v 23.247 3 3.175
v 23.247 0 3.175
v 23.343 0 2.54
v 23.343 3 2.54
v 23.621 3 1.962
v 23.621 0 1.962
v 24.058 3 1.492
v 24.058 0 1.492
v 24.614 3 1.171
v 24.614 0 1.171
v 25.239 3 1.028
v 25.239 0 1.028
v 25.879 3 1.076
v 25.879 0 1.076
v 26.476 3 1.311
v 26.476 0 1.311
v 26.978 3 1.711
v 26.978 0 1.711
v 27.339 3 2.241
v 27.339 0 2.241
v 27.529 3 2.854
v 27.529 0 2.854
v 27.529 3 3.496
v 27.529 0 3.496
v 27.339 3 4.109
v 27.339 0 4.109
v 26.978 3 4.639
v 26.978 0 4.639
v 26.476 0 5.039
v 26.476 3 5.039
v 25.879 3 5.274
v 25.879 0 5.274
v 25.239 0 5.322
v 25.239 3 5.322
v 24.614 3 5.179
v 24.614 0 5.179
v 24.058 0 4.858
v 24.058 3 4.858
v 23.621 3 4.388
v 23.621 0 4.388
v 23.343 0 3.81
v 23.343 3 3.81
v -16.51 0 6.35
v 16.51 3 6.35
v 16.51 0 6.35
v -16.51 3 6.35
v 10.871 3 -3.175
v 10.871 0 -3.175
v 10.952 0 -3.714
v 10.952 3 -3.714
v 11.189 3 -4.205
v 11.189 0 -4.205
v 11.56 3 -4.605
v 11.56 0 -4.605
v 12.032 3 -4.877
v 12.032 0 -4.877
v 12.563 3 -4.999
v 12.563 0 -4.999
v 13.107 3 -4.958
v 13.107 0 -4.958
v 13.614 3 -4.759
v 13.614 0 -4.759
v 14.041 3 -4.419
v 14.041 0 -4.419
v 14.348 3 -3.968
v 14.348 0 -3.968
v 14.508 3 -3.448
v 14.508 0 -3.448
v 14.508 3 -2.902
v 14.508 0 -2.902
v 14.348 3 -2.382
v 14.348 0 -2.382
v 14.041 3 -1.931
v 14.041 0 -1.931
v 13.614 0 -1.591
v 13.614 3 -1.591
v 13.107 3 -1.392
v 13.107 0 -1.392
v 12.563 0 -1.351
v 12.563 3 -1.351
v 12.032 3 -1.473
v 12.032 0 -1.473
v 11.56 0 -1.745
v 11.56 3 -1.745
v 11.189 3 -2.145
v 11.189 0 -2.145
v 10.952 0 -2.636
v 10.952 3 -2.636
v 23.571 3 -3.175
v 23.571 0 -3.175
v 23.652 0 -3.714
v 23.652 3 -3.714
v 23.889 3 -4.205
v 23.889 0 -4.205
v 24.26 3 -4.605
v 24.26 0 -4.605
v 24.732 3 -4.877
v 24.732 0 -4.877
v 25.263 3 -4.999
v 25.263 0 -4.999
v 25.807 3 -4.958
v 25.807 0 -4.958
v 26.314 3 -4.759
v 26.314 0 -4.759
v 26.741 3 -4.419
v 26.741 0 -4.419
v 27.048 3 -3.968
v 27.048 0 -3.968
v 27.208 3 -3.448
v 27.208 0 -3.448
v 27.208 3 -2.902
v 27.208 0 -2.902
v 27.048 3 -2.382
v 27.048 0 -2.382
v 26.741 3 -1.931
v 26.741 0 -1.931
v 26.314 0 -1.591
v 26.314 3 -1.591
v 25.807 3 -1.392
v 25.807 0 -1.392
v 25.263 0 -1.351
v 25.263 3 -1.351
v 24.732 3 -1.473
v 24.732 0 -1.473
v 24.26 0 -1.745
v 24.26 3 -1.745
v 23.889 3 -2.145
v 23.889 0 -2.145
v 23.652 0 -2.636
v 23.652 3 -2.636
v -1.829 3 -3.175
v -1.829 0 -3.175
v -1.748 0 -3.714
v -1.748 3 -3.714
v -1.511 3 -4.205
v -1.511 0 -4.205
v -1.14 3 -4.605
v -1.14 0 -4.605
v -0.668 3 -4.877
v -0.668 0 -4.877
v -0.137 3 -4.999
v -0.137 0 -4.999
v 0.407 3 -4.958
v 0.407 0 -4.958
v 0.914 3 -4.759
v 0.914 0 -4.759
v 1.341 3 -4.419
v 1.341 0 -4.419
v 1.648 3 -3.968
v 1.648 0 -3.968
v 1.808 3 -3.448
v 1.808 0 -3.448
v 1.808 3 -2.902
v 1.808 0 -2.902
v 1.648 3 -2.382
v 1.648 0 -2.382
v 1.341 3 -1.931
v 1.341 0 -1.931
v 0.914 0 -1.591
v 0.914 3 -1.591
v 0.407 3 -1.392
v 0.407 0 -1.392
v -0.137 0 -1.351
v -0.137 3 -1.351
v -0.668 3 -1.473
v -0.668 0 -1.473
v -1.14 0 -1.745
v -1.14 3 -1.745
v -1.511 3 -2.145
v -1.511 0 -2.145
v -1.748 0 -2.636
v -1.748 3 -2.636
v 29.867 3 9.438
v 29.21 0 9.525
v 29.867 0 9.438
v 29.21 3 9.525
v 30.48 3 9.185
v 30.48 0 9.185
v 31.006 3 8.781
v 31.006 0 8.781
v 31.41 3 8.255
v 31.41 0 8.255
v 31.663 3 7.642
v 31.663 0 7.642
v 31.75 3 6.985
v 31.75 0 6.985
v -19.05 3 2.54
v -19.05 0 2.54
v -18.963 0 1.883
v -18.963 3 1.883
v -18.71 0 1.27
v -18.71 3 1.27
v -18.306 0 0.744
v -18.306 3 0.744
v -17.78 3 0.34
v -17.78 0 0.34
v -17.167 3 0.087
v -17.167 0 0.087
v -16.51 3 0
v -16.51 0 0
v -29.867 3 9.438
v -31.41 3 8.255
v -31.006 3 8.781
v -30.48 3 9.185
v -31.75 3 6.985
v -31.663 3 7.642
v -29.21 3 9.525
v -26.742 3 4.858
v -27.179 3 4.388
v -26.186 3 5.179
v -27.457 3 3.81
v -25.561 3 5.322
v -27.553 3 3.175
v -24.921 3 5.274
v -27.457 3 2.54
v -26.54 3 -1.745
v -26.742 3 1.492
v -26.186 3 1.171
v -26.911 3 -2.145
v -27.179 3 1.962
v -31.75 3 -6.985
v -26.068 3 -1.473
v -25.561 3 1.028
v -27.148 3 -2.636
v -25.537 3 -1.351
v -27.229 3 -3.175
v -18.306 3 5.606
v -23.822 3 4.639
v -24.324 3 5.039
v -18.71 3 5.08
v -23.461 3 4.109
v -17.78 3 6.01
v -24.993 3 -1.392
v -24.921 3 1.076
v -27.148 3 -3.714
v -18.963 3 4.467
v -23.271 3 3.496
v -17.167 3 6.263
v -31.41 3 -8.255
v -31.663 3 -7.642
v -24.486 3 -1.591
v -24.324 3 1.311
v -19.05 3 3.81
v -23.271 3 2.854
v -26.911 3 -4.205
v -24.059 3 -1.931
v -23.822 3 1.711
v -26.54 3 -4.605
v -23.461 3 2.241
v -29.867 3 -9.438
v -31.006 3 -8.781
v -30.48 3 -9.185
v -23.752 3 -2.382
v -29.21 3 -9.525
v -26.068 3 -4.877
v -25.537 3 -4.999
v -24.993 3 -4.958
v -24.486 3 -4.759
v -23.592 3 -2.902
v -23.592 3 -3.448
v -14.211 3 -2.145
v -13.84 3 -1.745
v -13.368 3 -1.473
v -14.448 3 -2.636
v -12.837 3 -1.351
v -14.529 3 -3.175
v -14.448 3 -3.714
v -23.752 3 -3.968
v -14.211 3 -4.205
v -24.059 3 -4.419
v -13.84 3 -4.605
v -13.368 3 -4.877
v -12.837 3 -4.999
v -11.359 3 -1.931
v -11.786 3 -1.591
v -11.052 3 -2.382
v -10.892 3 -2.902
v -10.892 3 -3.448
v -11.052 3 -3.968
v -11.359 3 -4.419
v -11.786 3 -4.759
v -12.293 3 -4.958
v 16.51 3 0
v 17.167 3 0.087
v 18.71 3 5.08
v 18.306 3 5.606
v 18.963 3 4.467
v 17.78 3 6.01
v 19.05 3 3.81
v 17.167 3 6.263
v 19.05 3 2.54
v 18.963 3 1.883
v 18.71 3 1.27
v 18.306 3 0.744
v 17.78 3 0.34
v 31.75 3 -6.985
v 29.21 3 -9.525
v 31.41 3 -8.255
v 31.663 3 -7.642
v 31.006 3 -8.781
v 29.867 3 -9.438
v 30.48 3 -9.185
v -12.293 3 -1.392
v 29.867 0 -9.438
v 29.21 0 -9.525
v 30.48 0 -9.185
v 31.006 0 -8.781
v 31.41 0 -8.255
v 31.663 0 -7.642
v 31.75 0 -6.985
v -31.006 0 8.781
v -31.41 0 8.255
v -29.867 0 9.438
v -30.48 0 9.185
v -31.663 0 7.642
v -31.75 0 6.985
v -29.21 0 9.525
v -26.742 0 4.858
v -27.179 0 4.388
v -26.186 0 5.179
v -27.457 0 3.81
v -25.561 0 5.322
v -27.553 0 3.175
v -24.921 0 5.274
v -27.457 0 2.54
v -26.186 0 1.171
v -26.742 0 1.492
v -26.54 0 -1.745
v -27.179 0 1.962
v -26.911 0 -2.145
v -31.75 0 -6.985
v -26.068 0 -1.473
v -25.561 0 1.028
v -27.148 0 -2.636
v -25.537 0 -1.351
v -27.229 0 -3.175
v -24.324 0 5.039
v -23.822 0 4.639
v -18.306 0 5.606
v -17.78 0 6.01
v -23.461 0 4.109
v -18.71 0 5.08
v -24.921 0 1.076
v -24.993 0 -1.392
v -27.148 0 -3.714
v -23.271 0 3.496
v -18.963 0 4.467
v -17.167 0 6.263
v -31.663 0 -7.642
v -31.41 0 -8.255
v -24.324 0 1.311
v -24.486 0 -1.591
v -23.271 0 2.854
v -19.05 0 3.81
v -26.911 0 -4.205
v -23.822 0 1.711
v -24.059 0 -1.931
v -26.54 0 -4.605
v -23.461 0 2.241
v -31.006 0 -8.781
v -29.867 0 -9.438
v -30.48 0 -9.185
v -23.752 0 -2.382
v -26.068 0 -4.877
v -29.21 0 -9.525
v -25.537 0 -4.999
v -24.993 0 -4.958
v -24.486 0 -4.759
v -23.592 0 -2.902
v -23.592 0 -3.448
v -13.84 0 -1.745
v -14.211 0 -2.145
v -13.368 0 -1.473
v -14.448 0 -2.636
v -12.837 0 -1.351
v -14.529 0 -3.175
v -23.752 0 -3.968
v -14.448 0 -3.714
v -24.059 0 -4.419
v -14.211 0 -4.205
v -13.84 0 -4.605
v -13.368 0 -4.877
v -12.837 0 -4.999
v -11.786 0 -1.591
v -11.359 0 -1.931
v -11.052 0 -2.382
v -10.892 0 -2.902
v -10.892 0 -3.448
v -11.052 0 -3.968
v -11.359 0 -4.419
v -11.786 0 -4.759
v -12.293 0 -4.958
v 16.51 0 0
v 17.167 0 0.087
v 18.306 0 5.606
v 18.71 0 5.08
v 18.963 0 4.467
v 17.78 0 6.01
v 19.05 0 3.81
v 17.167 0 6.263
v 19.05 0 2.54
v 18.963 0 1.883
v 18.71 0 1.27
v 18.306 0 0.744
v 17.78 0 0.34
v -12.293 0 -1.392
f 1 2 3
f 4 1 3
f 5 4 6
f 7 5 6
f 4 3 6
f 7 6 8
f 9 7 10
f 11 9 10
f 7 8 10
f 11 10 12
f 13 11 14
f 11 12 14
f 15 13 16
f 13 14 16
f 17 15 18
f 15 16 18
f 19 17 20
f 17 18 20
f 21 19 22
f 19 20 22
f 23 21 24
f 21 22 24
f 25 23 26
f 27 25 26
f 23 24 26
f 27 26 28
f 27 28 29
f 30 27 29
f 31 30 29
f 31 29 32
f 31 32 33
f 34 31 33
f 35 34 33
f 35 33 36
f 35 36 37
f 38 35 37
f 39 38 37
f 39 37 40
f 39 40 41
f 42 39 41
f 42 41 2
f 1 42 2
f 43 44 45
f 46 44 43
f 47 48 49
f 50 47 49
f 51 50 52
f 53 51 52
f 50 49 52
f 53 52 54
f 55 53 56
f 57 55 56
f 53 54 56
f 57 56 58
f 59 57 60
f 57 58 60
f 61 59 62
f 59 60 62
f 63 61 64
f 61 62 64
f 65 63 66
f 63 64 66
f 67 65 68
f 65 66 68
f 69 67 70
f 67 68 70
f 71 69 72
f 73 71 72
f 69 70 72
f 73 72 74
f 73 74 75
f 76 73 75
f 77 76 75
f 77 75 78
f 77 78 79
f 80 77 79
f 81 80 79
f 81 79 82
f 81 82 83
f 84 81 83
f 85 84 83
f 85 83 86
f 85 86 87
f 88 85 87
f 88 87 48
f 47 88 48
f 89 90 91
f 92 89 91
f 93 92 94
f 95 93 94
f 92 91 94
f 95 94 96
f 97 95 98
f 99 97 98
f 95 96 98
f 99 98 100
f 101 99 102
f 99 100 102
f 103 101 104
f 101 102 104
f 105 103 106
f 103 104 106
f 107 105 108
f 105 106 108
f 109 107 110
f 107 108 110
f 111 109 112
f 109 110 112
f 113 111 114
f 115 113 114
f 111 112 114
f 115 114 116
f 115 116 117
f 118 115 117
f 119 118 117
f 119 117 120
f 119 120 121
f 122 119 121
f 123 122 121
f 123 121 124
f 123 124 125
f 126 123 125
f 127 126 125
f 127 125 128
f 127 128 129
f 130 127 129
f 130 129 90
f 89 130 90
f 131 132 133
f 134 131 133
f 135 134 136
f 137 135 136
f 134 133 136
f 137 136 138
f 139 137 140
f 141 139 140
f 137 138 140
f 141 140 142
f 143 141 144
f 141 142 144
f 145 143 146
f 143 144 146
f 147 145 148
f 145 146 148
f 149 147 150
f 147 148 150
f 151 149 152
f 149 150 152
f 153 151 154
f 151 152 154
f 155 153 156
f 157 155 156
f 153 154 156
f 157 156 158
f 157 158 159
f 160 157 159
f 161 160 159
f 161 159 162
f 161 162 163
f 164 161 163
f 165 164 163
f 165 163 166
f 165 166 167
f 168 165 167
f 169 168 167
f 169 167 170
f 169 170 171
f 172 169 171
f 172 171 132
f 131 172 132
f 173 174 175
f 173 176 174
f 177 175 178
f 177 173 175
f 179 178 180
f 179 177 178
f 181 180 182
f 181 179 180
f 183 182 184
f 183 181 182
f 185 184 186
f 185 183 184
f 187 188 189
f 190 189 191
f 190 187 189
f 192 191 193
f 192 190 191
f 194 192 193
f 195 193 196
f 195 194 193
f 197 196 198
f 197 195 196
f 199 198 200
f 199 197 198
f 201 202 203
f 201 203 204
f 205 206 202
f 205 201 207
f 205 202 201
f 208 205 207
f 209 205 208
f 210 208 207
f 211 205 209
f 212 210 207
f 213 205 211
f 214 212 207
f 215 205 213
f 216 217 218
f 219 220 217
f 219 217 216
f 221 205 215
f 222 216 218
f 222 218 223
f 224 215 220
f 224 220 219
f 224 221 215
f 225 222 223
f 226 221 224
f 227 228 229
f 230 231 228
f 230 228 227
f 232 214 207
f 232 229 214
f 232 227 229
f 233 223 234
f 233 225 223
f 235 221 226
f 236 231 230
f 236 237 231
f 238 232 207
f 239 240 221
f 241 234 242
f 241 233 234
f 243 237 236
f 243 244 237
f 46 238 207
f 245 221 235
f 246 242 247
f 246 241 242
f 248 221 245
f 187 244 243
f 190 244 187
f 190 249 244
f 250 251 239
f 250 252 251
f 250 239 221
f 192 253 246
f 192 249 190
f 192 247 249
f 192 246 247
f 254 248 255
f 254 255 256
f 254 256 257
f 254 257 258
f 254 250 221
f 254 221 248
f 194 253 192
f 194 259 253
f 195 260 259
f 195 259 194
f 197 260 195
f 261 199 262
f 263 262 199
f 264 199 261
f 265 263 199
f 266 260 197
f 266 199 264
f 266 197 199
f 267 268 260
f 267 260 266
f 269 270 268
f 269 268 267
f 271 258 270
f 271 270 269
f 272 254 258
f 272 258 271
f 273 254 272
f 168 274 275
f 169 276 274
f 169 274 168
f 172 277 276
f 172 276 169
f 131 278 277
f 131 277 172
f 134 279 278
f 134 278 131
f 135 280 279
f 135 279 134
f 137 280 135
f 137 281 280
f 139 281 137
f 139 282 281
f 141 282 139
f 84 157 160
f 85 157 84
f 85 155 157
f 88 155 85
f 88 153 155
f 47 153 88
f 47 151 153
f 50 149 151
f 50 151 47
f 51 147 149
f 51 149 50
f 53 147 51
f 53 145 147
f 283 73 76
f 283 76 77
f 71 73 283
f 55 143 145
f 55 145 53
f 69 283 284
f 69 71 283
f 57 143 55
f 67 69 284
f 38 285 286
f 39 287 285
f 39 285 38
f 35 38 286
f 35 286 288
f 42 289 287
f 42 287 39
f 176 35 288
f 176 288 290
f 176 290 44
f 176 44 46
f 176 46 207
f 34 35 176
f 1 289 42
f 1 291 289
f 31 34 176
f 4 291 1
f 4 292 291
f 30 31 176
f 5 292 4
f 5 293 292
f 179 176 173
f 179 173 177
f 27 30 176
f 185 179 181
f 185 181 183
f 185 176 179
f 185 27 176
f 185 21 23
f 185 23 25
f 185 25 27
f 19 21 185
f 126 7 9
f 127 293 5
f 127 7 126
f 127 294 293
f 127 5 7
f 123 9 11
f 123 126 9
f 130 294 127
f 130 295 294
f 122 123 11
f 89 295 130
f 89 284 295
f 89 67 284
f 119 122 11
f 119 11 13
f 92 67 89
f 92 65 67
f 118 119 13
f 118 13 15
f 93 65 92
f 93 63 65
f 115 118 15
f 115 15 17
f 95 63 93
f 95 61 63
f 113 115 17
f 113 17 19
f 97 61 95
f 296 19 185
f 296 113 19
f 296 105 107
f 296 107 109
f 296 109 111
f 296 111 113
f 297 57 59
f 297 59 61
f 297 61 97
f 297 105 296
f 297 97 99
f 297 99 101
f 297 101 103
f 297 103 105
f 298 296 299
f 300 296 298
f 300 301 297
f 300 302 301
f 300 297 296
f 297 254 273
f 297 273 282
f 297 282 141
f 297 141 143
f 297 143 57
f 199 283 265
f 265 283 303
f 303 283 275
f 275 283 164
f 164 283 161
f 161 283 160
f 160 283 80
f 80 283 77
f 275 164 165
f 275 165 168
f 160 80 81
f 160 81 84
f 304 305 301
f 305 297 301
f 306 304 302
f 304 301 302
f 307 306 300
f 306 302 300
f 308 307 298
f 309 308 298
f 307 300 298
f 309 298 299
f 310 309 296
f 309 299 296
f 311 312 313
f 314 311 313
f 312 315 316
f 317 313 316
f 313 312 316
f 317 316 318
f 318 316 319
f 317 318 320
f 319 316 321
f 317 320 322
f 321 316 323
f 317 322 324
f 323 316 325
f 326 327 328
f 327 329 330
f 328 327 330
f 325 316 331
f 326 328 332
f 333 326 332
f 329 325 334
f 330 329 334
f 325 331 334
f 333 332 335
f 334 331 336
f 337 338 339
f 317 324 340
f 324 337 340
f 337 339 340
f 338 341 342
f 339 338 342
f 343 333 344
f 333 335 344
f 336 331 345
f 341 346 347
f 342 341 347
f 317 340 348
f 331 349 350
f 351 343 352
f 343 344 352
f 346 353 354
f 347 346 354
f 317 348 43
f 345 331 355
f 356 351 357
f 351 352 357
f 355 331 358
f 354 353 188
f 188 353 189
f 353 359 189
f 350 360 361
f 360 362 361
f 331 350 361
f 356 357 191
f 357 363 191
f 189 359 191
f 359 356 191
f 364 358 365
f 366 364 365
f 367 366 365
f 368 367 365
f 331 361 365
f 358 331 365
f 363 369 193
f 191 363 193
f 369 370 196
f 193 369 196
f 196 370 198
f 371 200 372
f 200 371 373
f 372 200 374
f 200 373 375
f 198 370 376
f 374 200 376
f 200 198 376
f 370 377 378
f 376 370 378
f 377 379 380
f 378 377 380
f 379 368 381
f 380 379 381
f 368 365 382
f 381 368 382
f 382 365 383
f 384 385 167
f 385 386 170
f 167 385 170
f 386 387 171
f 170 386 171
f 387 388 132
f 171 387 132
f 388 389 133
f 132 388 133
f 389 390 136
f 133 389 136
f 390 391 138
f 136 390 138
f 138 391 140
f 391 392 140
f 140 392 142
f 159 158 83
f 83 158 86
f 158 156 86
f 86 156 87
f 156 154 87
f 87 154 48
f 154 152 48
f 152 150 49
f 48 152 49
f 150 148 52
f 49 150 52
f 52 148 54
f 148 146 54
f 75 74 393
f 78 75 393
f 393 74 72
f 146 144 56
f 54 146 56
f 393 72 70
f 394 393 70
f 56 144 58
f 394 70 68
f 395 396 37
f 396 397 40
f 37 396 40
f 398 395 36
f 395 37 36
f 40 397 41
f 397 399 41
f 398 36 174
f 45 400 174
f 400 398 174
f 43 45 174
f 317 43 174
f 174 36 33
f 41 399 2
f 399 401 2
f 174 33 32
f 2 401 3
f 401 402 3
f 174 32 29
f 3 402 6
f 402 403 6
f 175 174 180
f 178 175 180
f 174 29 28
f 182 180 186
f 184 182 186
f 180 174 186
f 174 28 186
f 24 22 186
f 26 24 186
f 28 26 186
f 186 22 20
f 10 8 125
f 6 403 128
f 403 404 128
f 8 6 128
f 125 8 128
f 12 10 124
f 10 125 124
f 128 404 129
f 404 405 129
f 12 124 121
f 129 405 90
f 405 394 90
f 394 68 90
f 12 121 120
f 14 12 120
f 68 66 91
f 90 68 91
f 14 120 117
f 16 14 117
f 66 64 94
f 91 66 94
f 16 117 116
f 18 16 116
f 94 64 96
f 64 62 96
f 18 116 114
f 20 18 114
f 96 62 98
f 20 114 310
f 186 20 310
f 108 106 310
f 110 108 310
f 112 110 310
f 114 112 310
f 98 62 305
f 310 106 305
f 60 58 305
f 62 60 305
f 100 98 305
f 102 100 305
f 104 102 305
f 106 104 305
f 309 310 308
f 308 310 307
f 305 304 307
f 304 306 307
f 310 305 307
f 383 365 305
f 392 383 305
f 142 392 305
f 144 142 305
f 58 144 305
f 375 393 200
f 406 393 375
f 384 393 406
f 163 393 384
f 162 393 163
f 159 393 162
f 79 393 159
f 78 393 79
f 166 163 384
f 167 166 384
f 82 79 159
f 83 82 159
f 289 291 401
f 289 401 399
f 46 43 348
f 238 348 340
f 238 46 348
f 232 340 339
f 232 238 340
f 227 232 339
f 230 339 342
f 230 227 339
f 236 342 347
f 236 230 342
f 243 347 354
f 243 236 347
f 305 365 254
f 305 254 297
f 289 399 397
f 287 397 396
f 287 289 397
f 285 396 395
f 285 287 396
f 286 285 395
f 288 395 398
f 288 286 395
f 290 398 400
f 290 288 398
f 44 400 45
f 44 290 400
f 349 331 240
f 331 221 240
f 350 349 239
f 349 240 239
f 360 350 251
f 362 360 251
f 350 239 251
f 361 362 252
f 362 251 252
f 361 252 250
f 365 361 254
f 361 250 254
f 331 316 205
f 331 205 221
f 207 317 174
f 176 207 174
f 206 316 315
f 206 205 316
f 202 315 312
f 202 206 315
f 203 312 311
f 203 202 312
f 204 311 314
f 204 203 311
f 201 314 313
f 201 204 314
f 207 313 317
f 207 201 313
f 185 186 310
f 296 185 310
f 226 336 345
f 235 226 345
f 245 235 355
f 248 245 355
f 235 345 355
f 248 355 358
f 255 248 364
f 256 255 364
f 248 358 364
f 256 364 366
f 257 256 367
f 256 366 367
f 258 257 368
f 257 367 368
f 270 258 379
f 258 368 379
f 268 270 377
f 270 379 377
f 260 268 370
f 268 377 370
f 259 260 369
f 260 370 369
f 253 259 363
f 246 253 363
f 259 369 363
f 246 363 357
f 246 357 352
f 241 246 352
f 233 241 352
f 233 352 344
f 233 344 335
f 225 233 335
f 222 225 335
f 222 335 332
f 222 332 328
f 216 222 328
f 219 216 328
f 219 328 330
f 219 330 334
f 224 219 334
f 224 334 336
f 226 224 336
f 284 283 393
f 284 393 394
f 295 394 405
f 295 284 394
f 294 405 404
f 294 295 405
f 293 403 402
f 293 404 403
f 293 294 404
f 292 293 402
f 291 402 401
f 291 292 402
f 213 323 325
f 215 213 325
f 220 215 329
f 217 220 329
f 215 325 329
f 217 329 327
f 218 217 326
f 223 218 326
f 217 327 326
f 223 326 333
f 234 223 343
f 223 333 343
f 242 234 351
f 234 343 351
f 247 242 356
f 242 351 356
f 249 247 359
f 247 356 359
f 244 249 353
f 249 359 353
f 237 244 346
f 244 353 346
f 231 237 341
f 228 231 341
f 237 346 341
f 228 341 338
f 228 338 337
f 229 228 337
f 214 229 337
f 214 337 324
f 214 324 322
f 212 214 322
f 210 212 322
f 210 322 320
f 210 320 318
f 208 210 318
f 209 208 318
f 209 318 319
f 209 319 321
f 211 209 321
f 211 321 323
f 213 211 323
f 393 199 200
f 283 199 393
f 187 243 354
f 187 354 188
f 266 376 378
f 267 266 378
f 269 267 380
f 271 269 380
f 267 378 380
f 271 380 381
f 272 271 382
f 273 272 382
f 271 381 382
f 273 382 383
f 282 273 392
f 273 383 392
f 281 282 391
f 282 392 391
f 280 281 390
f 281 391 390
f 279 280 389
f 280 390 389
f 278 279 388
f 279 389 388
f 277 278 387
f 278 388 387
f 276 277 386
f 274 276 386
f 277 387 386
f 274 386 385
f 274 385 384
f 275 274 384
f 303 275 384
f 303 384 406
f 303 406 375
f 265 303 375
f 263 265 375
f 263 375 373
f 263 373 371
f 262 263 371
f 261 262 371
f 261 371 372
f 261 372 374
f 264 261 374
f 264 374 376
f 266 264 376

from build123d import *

# Parameters (mm, degrees)
SKETCH1_W             = 63.5
SKETCH1_H             = 19.05
BOSS_EXTRUDE1_DEPTH   = 3
F_6_CLEARANCE_HOLE1_D = 3.6576
F_8_CLEARANCE_HOLE1_D = 4.3053
FILLET1_R             = 2.54
CUT_EXTRUDE1_DEPTH    = 34.283451218


with BuildPart() as part:
    # Sketch1 → Boss-Extrude1 (new body)
    with BuildSketch(Plane(origin=(0, 0, 0), x_dir=(1, 0, 0), z_dir=(0, 1, 0))):
        Rectangle(SKETCH1_W, SKETCH1_H)
    extrude(amount=BOSS_EXTRUDE1_DEPTH)

    # #6 Clearance Hole1 (through all)
    with Locations(Plane(origin=(0, 3, 0), x_dir=(1, 0, 0), z_dir=(0, 1, 0))):
        with Locations((-25.4, 3.175), (0, 3.175), (25.4, 3.175), (12.7, 3.175), (-12.7, 3.175)):
            Hole(F_6_CLEARANCE_HOLE1_D / 2)

    # #8 Clearance Hole1 (through all)
    with Locations(Plane(origin=(0, 3, 0), x_dir=(1, 0, 0), z_dir=(0, 1, 0))):
        with Locations((-25.4, -3.175), (25.4, -3.175)):
            Hole(F_8_CLEARANCE_HOLE1_D / 2)

    # Fillet1
    fillet1_edges = [part.edges().sort_by_distance(p)[0] for p in [
        (-31.75, 1.5, -9.525),
        (31.75, 1.5, -9.525),
        (31.75, 1.5, 9.525),
        (-31.75, 1.5, 9.525),
    ]]
    fillet(fillet1_edges, radius=FILLET1_R)

    # Sketch8 → Cut-Extrude1 (cut, through all)
    with BuildSketch(Plane(origin=(0, 3, 0), x_dir=(1, 0, 0), z_dir=(0, 1, 0))):
        with BuildLine():
            Line((16.51, -6.35), (-16.51, -6.35))
            ThreePointArc((-16.51, -6.35), (-18.306051224, -5.606051224), (-19.05, -3.81))
            Line((-19.05, -3.81), (-19.05, -2.54))
            ThreePointArc((-19.05, -2.54), (-18.306051224, -0.743948776), (-16.51, 0))
            Line((-16.51, 0), (16.51, 0))
            ThreePointArc((16.51, 0), (18.306051224, -0.743948776), (19.05, -2.54))
            Line((19.05, -2.54), (19.05, -3.81))
            ThreePointArc((19.05, -3.81), (18.306051224, -5.606051224), (16.51, -6.35))
        make_face()
    extrude(amount=-CUT_EXTRUDE1_DEPTH, mode=Mode.SUBTRACT)


solid = part.part
